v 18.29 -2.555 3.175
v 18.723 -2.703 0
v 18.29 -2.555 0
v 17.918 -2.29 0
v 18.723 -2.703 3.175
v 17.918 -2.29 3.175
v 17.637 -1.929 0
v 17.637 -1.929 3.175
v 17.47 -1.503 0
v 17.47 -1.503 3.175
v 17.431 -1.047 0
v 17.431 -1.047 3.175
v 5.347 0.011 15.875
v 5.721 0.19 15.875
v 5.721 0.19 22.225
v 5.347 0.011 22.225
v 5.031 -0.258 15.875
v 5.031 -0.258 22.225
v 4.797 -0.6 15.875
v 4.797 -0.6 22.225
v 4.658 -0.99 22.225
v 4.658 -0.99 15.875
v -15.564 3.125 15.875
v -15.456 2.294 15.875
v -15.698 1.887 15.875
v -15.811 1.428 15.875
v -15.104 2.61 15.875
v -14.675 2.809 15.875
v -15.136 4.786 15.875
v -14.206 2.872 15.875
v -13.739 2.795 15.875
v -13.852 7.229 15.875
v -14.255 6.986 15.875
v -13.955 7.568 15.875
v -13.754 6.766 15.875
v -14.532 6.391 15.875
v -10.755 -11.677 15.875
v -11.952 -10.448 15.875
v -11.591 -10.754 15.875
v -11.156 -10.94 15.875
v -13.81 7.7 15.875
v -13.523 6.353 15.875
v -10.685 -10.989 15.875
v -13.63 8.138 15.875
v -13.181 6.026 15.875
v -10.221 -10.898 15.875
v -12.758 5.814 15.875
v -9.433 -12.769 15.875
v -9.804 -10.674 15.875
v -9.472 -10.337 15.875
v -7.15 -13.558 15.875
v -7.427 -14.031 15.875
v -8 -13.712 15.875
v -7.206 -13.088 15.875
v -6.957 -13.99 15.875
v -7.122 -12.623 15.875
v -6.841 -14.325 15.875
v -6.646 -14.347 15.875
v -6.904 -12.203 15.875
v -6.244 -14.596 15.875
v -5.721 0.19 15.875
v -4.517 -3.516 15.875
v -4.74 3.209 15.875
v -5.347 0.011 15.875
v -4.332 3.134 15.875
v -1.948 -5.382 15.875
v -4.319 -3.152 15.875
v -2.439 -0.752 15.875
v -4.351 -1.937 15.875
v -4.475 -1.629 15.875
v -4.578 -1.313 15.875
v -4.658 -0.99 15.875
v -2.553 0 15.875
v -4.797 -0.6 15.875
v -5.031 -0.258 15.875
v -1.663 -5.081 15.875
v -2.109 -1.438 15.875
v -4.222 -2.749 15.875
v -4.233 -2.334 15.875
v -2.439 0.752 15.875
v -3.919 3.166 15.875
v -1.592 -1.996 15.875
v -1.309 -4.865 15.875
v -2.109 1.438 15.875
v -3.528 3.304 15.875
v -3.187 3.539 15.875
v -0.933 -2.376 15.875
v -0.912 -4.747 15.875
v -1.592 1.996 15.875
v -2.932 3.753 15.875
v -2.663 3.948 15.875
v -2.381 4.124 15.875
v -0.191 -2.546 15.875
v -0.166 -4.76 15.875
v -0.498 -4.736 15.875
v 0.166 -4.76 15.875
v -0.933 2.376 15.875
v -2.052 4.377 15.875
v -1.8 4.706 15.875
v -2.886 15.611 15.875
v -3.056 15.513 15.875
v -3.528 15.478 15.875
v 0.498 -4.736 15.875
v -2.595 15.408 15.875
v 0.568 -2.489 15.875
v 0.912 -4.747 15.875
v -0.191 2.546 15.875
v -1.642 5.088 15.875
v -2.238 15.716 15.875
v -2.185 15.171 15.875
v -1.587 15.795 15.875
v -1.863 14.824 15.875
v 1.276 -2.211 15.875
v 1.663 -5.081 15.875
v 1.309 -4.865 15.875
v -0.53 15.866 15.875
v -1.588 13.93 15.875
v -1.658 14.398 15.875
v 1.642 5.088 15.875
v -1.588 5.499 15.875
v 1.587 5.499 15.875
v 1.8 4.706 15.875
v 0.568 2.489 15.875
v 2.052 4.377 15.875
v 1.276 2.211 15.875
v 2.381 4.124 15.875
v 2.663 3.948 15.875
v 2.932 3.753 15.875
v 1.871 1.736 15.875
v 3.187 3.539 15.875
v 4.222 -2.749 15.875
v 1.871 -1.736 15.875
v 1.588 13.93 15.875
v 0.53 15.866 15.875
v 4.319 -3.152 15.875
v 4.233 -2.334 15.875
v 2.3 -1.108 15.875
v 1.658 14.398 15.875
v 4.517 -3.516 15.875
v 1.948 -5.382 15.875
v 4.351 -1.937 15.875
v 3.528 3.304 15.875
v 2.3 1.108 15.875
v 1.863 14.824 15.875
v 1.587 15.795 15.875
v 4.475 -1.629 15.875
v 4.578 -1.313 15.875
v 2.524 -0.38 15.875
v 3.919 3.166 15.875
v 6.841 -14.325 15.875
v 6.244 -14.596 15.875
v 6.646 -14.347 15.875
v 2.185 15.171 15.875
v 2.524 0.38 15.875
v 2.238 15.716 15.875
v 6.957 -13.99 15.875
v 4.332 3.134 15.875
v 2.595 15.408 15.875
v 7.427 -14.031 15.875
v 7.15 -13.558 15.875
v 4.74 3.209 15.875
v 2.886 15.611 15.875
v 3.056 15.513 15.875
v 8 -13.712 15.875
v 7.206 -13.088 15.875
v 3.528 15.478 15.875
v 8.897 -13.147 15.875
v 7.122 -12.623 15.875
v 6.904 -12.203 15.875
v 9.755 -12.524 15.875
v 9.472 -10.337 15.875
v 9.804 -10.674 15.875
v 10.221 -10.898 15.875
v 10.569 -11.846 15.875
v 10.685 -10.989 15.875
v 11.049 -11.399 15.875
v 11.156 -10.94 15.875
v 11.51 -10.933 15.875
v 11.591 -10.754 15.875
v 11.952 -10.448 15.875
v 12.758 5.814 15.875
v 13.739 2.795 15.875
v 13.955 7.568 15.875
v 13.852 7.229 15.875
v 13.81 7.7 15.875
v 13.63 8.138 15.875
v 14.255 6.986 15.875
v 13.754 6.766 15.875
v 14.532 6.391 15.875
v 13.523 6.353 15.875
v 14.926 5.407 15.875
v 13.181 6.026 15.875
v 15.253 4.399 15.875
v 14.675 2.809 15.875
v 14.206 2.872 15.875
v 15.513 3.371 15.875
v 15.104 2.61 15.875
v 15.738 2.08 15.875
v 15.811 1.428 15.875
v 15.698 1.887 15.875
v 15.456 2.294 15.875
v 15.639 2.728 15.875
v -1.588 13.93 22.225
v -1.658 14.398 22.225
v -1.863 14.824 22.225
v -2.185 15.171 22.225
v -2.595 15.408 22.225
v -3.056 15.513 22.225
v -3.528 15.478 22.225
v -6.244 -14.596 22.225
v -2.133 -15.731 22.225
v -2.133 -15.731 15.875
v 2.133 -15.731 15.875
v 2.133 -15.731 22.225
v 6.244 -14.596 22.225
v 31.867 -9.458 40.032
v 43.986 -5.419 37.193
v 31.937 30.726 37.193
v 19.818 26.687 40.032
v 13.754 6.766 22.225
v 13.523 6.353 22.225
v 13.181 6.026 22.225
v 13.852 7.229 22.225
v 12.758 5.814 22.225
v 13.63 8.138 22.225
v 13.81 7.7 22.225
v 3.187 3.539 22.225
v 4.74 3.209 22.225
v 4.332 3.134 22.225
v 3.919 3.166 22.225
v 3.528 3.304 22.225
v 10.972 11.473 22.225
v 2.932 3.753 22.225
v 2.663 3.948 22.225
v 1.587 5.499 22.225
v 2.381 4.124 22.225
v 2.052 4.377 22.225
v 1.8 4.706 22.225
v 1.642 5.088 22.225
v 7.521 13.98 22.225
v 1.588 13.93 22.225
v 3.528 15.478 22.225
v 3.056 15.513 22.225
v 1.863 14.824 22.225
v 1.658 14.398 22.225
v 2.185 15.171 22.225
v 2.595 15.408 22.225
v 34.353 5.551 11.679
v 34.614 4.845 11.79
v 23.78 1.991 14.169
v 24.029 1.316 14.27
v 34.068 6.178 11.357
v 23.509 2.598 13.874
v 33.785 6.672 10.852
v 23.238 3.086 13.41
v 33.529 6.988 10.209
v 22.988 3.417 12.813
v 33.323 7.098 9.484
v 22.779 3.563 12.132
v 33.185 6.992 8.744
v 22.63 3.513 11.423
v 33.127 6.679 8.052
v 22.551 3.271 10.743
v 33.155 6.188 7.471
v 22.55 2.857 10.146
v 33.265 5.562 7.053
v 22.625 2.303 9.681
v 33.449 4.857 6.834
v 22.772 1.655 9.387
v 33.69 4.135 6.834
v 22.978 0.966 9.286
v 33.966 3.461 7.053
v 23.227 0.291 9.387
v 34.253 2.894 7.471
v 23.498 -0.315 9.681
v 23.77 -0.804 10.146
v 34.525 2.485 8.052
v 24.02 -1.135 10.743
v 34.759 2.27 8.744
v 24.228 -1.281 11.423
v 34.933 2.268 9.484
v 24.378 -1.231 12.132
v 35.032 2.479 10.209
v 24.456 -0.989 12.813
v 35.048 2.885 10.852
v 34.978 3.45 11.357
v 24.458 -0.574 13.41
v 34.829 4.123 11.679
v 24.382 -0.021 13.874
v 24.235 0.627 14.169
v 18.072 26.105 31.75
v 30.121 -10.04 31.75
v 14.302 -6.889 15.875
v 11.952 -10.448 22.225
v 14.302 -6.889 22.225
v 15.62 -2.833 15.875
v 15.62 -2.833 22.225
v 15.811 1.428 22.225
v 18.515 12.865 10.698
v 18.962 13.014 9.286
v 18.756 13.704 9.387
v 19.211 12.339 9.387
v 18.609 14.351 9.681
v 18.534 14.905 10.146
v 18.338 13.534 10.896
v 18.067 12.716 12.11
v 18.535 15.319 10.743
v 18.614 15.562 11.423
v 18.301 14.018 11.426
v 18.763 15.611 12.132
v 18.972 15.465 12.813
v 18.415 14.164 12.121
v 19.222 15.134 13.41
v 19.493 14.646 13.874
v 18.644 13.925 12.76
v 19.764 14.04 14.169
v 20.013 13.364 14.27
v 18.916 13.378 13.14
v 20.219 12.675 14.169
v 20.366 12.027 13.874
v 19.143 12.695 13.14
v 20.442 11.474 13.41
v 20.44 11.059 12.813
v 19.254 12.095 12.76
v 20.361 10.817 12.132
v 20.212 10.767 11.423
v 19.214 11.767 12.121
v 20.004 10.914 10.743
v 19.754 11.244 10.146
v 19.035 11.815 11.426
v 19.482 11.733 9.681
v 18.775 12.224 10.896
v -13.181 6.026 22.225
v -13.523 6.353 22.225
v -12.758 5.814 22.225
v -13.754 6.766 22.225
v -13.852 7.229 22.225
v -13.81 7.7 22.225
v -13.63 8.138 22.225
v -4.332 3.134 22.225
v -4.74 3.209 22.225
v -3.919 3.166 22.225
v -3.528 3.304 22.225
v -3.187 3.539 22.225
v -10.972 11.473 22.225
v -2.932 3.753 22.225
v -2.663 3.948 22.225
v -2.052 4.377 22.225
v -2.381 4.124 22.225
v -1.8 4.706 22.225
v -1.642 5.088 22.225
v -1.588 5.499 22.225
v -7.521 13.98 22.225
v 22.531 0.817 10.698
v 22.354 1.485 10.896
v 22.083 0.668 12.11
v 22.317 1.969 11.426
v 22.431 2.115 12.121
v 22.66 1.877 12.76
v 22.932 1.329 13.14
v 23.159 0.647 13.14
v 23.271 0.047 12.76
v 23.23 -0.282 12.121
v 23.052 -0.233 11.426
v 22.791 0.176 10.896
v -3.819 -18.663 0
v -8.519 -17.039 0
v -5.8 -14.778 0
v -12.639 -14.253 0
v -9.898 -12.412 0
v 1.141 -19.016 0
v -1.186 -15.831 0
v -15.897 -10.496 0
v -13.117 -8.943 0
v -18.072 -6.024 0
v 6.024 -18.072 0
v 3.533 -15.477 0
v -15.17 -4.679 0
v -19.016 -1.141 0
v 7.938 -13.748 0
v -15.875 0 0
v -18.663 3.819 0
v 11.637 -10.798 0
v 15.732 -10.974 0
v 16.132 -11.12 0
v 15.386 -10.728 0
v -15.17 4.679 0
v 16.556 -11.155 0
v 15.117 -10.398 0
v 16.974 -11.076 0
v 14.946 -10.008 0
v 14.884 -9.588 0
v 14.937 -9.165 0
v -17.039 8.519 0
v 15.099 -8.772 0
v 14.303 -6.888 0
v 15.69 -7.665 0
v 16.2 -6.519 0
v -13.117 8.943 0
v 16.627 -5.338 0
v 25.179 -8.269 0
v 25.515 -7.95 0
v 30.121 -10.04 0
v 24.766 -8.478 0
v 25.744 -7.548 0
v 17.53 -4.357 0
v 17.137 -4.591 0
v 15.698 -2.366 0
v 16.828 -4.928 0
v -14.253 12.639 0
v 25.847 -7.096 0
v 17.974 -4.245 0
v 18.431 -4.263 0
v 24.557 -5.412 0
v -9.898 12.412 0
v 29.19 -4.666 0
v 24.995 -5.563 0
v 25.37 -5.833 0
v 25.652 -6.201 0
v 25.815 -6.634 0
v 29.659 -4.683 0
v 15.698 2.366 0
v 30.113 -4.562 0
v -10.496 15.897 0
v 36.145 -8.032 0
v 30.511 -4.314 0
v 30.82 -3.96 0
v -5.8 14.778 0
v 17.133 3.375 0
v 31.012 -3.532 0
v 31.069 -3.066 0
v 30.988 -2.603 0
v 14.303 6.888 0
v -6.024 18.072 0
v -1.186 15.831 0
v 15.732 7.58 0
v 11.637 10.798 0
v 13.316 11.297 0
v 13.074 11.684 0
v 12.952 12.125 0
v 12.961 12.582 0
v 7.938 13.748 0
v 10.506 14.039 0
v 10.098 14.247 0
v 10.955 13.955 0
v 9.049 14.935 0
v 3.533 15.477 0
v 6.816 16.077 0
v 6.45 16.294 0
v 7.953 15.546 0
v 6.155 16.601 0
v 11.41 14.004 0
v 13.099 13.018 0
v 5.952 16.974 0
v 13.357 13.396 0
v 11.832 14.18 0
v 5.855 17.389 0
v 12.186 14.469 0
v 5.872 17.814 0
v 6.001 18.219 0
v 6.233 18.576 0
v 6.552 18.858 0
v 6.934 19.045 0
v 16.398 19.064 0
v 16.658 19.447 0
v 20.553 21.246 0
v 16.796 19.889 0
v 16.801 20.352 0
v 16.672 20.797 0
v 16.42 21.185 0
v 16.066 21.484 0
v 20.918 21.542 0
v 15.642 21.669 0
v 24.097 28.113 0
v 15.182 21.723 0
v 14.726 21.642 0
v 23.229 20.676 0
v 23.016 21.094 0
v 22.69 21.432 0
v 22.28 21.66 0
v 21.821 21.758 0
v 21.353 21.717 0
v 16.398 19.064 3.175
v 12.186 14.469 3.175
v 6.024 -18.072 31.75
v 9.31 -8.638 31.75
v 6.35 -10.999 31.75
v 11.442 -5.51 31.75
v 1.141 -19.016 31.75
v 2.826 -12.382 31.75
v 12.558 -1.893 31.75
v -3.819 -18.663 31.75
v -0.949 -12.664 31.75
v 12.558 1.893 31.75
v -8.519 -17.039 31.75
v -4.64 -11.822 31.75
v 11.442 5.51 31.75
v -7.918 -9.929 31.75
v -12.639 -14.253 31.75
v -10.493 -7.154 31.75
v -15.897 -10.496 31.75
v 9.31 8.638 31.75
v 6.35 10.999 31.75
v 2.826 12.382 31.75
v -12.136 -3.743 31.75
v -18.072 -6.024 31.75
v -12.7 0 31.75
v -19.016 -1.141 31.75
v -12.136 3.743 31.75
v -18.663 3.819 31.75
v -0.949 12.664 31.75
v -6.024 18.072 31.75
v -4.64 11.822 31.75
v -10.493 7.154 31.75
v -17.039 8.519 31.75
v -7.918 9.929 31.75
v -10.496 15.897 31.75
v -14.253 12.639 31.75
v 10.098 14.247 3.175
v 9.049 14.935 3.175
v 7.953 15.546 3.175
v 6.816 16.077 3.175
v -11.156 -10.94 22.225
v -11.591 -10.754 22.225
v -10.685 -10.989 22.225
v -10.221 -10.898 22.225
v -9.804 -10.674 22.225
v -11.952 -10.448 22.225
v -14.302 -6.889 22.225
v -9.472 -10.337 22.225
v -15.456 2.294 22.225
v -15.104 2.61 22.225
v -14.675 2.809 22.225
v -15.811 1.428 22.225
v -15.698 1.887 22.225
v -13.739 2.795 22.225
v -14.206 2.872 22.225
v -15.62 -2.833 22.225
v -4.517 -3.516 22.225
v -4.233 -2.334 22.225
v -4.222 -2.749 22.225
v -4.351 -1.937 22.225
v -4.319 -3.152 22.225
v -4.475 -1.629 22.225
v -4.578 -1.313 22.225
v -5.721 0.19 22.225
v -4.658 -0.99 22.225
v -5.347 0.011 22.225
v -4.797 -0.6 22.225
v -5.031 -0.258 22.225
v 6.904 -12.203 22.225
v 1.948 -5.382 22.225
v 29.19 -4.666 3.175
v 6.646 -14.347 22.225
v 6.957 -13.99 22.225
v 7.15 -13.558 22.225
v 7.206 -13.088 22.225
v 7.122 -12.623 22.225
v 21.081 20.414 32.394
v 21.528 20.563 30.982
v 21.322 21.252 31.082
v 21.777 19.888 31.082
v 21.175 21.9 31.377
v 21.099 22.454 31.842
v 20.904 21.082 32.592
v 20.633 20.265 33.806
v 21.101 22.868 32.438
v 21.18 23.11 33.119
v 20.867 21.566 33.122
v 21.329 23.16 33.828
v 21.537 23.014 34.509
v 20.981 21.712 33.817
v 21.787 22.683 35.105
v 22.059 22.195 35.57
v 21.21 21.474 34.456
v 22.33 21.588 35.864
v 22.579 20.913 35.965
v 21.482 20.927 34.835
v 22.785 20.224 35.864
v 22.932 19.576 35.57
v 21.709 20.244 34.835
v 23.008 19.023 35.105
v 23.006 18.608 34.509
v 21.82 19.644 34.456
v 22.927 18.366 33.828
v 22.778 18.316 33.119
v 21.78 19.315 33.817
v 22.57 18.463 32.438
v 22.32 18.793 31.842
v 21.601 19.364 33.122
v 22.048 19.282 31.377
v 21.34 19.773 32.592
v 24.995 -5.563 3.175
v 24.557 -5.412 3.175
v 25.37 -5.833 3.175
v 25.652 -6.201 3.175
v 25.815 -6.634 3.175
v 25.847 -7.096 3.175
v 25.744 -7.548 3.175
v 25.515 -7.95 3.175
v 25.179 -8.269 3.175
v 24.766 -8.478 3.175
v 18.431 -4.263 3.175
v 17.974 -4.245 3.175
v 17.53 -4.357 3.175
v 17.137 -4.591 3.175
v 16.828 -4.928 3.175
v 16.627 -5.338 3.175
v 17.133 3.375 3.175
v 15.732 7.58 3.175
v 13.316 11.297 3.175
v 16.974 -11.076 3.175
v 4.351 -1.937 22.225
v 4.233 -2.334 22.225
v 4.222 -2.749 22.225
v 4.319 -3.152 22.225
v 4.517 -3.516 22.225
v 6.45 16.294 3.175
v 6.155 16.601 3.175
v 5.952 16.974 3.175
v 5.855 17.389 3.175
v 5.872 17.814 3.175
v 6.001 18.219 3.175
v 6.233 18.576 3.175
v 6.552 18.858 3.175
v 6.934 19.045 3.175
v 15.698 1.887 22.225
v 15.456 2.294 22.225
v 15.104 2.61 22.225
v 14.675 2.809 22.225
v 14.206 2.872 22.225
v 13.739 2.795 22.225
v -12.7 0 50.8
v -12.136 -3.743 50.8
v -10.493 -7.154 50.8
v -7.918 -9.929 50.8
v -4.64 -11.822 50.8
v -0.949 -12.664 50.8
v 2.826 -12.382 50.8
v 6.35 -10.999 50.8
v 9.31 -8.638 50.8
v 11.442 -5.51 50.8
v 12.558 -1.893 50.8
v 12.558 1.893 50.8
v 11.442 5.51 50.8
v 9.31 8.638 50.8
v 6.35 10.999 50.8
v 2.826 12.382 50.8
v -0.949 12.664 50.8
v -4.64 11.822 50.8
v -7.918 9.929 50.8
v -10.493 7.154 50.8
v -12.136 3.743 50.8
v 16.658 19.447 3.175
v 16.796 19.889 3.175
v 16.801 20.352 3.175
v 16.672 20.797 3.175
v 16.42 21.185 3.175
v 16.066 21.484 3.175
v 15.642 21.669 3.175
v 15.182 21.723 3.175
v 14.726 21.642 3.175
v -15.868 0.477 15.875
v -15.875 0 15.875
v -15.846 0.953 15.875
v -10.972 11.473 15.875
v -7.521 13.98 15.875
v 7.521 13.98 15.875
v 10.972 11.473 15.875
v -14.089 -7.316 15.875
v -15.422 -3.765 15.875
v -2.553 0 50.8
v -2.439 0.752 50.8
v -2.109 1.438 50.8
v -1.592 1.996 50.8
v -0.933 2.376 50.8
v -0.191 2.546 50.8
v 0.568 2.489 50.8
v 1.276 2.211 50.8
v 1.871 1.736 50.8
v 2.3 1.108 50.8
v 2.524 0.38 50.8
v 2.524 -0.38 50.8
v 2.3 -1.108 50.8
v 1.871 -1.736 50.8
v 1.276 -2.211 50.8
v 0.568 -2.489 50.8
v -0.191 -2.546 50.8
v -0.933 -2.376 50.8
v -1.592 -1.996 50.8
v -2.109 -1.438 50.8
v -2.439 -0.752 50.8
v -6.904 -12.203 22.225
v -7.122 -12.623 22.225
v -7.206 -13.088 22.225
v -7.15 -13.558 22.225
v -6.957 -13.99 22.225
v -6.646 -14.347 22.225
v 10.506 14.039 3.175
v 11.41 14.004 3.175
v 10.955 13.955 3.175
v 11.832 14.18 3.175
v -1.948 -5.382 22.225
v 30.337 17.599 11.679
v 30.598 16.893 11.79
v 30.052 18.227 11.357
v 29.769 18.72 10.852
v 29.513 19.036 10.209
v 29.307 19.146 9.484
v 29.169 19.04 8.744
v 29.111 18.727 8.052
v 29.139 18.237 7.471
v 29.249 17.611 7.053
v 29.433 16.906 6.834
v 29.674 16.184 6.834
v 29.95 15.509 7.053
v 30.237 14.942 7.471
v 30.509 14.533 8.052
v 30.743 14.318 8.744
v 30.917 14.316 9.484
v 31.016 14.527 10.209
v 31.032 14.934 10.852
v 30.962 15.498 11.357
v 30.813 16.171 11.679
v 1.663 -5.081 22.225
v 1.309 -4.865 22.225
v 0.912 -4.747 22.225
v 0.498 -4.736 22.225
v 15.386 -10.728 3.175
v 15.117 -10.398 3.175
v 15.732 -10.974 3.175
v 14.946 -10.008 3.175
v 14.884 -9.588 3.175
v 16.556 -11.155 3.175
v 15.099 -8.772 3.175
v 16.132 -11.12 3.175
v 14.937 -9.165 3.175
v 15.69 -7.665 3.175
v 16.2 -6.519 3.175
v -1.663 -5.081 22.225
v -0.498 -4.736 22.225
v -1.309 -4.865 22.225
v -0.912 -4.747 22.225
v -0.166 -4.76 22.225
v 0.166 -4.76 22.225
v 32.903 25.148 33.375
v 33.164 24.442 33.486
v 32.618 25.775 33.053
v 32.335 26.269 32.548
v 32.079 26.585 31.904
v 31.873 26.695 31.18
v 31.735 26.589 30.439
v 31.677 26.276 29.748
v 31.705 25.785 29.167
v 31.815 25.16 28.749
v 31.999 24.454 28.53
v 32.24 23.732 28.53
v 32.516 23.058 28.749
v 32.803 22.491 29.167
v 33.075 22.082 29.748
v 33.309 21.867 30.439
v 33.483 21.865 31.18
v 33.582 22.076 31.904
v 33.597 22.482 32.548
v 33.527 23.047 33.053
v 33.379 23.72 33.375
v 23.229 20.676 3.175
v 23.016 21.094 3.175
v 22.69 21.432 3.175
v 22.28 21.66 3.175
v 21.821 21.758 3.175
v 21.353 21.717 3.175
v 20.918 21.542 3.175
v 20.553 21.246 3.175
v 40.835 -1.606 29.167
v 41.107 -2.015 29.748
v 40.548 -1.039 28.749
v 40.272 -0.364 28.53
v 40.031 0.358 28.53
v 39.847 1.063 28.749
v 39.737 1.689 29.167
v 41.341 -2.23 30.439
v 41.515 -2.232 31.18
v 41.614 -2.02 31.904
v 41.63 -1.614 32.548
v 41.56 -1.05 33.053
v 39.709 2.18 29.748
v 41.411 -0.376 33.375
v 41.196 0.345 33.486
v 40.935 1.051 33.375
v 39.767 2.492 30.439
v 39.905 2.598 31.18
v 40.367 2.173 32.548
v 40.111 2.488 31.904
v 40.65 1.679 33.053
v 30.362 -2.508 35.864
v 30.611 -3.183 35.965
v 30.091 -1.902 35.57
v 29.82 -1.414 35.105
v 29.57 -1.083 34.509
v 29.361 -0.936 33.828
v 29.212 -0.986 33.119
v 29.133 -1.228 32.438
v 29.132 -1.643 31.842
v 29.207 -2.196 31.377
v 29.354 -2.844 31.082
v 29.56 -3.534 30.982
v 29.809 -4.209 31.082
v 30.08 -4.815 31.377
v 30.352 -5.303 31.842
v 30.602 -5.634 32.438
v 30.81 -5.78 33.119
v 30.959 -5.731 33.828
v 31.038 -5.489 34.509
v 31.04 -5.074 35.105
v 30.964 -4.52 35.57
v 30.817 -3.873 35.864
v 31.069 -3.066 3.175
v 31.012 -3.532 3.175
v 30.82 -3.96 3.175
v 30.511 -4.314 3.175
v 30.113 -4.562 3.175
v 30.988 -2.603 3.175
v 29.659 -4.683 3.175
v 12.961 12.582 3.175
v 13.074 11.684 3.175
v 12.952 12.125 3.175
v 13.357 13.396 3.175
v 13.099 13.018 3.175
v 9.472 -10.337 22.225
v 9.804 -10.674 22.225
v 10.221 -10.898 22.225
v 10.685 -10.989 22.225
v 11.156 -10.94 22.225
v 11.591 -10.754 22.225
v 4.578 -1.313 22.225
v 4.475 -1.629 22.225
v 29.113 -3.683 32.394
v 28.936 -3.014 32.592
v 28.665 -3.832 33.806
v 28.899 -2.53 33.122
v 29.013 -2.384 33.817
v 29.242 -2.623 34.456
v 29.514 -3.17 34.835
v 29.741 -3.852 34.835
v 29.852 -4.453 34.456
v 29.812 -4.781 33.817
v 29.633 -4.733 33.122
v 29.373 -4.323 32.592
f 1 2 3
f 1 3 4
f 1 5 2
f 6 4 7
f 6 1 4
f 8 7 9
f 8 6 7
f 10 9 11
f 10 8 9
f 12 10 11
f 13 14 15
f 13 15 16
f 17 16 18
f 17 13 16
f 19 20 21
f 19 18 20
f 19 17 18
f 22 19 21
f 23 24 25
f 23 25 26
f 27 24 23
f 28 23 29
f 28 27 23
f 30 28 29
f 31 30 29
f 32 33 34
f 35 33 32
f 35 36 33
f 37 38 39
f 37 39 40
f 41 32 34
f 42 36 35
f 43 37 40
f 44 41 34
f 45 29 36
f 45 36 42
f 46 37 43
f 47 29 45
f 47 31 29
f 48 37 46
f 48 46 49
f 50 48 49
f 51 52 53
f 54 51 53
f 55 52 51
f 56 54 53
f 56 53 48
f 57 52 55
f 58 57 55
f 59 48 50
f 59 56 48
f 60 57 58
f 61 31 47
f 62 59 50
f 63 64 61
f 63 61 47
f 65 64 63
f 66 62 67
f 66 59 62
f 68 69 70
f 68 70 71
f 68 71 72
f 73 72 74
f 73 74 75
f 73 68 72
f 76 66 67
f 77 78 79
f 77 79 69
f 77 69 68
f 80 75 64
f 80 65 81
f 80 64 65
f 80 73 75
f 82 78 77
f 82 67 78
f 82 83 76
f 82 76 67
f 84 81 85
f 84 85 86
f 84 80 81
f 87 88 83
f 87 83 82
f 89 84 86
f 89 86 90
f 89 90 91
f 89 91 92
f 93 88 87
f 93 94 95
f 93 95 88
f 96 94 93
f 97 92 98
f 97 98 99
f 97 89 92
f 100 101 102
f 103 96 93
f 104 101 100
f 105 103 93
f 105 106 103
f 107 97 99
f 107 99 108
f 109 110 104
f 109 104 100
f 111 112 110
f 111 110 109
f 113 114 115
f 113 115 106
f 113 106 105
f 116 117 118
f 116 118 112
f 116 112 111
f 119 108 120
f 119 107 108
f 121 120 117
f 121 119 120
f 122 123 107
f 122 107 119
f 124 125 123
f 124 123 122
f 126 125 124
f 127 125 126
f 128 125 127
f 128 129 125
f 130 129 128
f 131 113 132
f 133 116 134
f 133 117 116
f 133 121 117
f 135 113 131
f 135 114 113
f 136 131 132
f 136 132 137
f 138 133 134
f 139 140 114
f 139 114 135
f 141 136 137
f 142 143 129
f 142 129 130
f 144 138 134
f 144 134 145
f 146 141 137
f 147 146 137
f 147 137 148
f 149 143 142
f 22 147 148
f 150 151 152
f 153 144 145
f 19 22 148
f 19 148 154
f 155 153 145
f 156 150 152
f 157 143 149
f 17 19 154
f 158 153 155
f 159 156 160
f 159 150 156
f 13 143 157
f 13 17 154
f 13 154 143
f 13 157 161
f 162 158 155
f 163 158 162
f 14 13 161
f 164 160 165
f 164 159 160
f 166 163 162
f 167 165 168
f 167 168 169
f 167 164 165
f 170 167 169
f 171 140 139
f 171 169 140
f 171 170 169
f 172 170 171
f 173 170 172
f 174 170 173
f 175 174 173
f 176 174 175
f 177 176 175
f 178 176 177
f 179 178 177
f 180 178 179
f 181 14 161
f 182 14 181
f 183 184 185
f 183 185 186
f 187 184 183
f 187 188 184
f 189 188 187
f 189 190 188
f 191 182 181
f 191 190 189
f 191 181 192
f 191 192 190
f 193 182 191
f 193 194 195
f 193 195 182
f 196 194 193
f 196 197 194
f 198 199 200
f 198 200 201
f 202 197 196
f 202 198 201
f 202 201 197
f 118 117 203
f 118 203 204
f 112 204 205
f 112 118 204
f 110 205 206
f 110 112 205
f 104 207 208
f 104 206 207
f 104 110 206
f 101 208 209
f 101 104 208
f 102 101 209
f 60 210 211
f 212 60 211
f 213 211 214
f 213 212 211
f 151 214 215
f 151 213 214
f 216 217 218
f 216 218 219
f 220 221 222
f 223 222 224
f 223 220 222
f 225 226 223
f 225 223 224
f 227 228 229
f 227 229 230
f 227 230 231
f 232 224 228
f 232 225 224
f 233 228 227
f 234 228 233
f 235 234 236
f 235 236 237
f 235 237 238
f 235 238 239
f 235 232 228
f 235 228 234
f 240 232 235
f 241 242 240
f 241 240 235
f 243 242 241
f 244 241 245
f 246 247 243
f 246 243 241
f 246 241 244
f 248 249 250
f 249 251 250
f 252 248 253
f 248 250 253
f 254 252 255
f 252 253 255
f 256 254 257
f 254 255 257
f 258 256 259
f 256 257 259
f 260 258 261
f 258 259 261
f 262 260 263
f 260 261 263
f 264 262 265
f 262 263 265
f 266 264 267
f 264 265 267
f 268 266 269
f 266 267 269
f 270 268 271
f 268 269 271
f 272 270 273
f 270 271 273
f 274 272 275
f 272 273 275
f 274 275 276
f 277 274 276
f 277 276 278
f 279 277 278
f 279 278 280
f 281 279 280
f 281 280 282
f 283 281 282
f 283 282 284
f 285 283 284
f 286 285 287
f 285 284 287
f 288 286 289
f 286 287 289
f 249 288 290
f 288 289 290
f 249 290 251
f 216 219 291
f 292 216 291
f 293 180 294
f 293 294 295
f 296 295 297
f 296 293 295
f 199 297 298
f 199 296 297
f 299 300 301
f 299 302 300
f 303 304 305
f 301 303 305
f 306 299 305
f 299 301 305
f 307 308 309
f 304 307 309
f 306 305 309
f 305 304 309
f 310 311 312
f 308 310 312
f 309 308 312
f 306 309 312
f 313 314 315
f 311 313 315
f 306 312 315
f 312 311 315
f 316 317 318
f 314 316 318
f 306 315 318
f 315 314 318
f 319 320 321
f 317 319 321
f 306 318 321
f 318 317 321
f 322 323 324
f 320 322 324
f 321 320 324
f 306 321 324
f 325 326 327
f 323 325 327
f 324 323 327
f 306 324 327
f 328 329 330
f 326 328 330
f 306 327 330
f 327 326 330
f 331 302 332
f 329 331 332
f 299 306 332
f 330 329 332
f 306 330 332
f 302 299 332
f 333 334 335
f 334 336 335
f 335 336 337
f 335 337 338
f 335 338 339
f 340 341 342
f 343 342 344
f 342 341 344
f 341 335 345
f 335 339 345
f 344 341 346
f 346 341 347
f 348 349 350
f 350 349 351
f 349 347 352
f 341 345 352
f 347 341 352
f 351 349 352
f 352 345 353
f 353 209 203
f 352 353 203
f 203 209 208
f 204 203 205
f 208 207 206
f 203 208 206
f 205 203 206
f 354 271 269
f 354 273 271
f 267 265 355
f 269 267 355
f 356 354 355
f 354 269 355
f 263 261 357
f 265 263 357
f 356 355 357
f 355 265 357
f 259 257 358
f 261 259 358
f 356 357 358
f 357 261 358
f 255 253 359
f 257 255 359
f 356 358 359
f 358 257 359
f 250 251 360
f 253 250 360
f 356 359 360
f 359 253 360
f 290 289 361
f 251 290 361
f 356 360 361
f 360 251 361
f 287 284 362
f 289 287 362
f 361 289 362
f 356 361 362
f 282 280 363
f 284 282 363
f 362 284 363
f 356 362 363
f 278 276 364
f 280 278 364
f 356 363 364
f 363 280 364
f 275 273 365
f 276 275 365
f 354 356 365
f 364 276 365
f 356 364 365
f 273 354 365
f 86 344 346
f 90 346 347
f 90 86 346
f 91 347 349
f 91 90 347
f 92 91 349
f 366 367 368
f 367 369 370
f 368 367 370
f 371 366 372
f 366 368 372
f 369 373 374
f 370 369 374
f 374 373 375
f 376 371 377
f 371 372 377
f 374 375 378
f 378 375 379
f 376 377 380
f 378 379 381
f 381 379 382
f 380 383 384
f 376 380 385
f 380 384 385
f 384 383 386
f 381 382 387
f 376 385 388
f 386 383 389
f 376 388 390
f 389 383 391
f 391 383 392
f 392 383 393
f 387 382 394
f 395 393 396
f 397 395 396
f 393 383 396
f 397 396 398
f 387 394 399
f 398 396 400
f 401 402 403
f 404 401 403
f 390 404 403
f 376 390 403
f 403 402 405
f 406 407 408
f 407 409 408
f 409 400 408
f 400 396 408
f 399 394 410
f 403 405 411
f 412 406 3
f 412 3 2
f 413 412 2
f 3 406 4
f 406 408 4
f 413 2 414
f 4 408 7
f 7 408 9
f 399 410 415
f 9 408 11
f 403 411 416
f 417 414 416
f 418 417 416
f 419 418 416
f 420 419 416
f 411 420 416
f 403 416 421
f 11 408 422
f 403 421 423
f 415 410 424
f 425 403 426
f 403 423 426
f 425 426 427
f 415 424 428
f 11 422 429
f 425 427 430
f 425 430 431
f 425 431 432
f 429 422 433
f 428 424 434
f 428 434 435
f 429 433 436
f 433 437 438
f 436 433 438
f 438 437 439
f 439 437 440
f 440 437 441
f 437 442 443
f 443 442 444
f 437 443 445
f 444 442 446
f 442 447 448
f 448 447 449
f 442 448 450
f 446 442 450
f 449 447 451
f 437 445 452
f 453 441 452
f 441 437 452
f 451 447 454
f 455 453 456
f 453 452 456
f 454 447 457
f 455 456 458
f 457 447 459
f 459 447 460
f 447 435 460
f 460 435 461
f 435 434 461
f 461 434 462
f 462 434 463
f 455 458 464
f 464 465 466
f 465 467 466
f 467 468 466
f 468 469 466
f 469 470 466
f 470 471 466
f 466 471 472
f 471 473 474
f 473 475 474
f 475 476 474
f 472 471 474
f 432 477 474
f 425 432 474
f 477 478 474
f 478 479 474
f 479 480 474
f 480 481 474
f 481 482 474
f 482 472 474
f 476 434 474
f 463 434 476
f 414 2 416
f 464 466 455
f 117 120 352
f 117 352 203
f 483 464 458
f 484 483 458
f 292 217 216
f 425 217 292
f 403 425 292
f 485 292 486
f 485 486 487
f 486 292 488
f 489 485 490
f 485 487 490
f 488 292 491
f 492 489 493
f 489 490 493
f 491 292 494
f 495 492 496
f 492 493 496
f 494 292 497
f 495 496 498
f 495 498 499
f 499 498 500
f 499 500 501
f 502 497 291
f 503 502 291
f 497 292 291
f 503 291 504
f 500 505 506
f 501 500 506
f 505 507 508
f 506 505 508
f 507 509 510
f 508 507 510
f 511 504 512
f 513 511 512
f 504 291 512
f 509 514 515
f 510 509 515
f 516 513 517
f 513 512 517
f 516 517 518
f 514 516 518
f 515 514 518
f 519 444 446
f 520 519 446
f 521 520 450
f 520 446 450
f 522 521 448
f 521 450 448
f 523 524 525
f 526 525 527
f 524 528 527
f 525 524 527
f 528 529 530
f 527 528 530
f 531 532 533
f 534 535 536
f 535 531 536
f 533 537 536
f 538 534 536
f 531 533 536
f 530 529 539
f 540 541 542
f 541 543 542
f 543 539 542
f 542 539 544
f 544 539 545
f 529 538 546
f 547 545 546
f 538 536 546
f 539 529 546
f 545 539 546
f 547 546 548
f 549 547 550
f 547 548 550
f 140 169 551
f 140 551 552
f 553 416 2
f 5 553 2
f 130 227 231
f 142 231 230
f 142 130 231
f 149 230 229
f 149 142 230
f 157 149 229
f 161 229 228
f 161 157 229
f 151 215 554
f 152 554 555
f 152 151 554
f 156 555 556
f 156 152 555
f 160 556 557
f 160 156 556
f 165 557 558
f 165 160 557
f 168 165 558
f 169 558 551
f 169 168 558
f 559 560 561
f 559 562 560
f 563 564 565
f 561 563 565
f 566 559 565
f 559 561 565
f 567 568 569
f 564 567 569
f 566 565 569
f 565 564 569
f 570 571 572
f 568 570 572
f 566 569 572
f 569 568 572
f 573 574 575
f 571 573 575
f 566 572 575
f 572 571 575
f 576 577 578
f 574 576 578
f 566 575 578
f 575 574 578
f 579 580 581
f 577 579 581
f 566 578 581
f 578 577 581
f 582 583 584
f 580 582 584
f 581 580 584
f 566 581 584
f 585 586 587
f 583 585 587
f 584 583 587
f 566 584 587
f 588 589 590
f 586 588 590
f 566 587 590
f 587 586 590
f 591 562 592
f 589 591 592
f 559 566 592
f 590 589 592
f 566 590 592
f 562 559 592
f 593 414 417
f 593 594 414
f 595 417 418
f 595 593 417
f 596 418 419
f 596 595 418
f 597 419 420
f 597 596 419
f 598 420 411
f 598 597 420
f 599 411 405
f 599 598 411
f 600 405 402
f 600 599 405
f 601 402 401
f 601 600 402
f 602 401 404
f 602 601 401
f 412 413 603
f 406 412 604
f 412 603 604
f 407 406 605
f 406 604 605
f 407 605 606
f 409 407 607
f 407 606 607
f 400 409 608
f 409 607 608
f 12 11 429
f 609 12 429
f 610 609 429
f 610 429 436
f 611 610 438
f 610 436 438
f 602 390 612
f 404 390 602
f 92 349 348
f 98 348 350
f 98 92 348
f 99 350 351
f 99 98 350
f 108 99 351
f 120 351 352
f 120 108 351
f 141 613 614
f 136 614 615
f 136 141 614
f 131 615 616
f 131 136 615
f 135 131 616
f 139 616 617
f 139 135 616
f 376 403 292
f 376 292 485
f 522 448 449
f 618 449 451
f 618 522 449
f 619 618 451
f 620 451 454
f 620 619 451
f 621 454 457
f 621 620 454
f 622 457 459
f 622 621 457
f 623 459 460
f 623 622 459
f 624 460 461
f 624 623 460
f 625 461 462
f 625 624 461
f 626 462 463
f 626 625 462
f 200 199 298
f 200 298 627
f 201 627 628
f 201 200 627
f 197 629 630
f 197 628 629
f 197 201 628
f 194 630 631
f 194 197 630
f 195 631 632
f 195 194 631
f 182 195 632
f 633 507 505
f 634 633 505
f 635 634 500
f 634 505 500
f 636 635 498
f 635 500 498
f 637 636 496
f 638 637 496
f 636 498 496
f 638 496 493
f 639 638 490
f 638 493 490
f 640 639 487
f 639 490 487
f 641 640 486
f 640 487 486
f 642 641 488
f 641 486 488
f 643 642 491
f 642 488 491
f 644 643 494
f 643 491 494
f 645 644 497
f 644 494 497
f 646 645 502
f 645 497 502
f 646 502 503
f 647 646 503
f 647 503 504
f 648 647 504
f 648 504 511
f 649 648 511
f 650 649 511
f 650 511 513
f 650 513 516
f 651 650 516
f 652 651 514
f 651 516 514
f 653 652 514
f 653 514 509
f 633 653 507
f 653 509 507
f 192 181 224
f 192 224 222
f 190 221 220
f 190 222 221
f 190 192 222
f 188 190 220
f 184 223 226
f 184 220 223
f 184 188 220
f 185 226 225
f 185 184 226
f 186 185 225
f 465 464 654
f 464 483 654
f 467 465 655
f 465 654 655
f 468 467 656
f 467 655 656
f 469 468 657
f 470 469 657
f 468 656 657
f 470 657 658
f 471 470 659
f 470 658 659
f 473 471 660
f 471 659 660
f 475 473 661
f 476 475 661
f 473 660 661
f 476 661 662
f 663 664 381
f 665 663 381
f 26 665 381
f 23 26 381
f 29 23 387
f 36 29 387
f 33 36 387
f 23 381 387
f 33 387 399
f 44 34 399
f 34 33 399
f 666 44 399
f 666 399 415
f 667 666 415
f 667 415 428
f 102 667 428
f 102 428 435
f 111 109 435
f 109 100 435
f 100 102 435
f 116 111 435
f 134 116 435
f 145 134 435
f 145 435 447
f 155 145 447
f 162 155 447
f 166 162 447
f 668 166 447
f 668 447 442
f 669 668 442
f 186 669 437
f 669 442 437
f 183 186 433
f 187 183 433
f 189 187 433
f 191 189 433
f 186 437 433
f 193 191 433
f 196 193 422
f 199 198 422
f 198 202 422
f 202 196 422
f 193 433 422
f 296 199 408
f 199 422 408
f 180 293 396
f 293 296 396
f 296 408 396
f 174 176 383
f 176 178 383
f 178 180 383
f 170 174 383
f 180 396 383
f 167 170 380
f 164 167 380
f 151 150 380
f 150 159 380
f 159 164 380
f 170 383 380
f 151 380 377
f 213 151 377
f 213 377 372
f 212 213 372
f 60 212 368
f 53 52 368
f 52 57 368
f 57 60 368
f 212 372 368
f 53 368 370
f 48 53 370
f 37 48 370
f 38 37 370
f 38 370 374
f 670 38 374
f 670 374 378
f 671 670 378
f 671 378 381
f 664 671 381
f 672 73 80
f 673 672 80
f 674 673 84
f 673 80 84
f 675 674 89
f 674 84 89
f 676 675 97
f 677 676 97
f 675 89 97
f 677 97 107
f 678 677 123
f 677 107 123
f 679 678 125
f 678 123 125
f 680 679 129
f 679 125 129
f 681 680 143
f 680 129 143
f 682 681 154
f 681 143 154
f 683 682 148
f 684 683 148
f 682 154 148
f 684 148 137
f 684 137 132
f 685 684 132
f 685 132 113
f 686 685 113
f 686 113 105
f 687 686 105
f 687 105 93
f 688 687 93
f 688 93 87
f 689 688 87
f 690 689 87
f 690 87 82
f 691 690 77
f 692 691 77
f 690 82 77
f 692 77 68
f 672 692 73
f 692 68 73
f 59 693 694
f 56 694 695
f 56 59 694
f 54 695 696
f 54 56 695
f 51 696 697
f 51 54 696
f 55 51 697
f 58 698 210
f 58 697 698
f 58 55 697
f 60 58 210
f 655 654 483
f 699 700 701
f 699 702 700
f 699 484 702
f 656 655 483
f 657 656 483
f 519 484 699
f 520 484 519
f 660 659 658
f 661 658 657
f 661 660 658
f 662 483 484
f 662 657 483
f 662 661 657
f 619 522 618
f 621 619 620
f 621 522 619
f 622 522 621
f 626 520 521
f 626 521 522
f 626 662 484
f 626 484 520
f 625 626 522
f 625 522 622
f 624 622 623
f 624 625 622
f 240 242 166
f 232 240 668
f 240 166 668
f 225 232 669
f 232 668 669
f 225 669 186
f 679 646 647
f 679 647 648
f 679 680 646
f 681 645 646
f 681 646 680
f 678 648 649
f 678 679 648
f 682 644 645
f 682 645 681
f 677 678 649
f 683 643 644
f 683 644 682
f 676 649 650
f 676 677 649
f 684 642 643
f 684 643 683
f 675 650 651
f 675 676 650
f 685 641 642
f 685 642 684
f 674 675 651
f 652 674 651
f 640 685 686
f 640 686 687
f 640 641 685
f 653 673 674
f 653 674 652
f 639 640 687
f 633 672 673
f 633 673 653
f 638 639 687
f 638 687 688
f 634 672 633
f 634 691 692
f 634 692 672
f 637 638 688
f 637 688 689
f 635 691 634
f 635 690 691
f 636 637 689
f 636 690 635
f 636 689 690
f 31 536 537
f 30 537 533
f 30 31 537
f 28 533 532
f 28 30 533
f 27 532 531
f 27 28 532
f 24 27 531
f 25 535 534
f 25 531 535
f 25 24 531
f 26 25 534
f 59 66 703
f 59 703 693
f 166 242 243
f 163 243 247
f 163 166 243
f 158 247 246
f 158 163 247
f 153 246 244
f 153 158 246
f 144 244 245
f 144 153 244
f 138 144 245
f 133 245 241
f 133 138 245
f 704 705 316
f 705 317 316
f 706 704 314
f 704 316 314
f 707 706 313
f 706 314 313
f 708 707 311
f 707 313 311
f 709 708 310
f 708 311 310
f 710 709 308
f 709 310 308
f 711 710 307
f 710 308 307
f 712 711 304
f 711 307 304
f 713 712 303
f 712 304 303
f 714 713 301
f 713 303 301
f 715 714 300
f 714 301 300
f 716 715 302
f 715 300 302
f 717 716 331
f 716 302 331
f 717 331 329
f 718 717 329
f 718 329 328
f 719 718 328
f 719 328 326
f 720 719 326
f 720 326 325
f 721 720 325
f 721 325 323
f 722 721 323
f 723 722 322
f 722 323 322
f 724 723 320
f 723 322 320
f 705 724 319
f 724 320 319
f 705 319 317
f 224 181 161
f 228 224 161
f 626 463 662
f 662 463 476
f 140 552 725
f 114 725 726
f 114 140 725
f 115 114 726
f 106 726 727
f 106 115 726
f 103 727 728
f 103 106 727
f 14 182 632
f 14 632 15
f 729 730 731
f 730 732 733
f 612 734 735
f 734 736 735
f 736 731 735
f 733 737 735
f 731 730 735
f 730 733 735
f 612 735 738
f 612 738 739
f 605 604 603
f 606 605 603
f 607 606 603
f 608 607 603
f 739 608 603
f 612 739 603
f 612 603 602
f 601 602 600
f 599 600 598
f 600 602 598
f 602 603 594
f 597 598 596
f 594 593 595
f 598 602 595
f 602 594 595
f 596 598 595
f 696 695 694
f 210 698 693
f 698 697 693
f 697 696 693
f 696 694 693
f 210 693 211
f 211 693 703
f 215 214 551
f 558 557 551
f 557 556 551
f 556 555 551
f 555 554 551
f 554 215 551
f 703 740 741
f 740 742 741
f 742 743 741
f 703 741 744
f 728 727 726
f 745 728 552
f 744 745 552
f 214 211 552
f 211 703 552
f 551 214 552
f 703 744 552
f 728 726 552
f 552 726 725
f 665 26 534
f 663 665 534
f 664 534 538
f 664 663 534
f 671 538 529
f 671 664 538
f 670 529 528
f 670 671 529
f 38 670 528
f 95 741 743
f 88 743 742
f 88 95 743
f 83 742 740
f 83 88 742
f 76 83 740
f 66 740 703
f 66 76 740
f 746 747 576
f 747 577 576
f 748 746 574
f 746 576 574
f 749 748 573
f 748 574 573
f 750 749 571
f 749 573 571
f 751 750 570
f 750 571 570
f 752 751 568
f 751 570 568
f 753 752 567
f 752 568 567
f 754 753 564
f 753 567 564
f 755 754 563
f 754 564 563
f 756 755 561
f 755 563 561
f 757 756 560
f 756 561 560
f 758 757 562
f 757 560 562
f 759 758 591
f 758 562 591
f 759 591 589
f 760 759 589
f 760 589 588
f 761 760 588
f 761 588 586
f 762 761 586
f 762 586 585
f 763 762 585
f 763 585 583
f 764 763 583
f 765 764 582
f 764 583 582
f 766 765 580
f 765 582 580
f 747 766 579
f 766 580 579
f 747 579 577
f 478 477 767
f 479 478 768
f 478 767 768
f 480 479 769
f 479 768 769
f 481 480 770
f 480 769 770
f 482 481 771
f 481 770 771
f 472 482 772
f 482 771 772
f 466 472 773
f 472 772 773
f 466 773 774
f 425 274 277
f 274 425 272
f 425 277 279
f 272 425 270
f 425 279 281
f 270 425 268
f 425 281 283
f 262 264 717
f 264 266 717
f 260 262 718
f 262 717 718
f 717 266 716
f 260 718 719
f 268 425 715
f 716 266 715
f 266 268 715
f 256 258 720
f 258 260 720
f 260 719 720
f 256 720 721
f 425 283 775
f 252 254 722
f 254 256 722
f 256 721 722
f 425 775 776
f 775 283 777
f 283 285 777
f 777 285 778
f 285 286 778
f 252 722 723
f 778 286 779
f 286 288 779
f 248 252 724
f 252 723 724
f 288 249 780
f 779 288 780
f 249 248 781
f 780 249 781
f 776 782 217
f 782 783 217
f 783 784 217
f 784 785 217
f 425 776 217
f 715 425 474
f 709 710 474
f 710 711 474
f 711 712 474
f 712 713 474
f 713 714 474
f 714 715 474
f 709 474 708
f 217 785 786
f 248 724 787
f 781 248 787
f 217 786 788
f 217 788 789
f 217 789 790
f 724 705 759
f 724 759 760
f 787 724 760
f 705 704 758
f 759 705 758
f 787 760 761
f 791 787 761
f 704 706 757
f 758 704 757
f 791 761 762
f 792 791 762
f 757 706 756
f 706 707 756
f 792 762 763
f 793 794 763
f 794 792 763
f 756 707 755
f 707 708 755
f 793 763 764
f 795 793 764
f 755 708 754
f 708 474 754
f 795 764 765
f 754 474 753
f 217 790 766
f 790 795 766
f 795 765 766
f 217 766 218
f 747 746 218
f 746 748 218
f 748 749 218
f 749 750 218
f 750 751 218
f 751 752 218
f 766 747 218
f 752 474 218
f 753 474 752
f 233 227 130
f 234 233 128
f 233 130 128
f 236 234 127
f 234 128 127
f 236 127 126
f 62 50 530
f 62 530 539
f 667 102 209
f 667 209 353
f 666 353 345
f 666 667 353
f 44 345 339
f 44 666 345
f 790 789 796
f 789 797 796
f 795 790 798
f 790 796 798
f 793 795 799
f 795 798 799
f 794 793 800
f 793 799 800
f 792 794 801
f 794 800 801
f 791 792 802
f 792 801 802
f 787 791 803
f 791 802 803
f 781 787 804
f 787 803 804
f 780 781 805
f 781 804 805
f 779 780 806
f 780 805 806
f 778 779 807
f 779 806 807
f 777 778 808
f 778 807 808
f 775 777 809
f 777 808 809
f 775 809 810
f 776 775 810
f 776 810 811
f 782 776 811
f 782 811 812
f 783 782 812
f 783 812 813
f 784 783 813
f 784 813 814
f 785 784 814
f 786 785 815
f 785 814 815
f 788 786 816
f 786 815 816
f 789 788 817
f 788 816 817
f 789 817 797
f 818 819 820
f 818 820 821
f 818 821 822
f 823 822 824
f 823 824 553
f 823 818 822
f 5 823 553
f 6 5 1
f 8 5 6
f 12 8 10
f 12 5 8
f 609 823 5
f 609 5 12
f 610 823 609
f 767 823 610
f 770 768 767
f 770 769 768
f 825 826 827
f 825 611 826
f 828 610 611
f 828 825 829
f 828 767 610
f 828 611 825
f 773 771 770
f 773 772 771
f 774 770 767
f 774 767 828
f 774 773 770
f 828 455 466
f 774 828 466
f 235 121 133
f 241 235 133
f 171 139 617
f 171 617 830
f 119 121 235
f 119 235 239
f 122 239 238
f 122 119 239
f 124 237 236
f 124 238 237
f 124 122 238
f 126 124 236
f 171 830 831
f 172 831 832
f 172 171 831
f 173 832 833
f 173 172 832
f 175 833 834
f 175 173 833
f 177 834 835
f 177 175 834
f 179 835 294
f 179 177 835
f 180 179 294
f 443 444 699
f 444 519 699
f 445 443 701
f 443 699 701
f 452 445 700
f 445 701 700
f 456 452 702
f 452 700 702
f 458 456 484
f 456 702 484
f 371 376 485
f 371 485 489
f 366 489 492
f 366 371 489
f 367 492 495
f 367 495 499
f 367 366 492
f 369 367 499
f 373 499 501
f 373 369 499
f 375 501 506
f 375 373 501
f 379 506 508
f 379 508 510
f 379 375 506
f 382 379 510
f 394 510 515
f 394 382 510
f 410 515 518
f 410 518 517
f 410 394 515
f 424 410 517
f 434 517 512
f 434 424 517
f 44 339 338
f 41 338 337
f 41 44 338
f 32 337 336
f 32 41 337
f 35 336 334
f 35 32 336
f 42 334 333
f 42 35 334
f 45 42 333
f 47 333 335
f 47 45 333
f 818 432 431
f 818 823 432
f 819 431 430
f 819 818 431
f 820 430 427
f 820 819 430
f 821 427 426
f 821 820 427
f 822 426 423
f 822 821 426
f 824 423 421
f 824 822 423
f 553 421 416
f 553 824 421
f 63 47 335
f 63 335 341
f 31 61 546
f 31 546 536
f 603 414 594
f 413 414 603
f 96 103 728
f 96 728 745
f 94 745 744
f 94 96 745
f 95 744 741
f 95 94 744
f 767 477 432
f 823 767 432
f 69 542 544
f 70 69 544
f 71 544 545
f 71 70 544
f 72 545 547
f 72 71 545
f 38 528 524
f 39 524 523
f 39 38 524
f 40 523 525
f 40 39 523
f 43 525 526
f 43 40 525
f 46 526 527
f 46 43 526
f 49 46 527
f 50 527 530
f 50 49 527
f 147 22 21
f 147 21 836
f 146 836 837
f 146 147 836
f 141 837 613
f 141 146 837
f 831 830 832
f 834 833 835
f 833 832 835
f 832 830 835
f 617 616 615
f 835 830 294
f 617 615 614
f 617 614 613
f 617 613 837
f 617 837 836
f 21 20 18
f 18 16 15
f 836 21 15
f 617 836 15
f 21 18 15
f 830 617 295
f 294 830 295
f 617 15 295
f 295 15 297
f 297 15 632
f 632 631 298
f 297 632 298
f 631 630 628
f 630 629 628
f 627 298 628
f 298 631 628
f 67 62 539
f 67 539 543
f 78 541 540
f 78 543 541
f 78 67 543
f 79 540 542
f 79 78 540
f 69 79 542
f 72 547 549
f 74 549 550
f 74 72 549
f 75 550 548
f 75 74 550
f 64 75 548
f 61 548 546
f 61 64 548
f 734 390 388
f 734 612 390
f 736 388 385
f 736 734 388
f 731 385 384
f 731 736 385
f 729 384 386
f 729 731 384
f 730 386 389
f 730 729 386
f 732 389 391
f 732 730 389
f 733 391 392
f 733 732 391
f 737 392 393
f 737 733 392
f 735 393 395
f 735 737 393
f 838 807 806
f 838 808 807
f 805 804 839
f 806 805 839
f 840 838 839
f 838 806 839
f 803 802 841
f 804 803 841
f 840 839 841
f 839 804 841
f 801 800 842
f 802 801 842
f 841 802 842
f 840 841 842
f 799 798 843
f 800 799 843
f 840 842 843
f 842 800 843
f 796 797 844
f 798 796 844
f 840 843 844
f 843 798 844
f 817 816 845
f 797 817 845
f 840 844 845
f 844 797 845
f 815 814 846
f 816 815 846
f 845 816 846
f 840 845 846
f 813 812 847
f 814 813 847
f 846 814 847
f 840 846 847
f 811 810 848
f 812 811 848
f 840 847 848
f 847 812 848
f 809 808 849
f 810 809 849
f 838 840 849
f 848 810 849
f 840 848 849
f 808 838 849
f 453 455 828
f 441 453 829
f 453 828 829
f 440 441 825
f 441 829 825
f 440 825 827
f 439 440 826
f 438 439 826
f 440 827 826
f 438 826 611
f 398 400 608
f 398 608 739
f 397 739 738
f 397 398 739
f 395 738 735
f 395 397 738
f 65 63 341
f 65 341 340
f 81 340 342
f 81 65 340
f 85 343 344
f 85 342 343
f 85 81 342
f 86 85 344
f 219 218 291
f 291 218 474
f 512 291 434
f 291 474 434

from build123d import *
from build123d.topology import SkipClean

# Parameters (mm, degrees)
BOSS_EXTRUDE1_DEPTH         = 31.75
BOSS_EXTRUDE4_DEPTH         = 38.1
SKETCH11_R                  = 12.7
BOSS_EXTRUDE5_DEPTH         = 19.05
F_1_4_20_TAPPED_HOLE3_D     = 5.1054
F_1_4_20_TAPPED_HOLE3_DEPTH = 38.1
F_1_4_20_TAPPED_HOLE3_TIP   = 1.533816902
F_1_4_20_TAPPED_HOLE4_D     = 5.1054
F_1_4_20_TAPPED_HOLE4_DEPTH = 11.43
F_1_4_20_TAPPED_HOLE4_TIP   = 1.533816902
CUT_EXTRUDE3_DEPTH          = 3.175
SKETCH17_R                  = 15.875
CUT_EXTRUDE4_DEPTH          = 15.875
FILLET3_R                   = 1.5875
CUT_EXTRUDE5_DEPTH          = 6.35
FILLET4_R                   = 1.5875


with BuildPart() as part:
    # Sketch1 → Boss-Extrude1 (new body)
    with BuildSketch(Plane.XY):
        with BuildLine():
            Line((18.072416828, 26.104602085), (30.120694713, -10.040231571))
            Line((30.120694713, -10.040231571), (6.024138943, -18.072416828))
            ThreePointArc((6.024138943, -18.072416828), (-18.072416828, -6.024138943), (-6.024138943, 18.072416828))
            Line((-6.024138943, 18.072416828), (18.072416828, 26.104602085))
        make_face()
    extrude(amount=BOSS_EXTRUDE1_DEPTH)

    # Sketch10 → Boss-Extrude4 (add)
    with BuildSketch(Plane(origin=(-6.024138943, 18.072416828, 0), x_dir=(0.9486832980505138, 0.31622776601683816, 0), z_dir=(-0.31622776601683816, 0.9486832980505138, 0))):
        Polygon((25.4, 0), (31.75, 0), (40.015050599, -37.192726958), (27.240344607, -40.031550568), (25.4, -31.75), align=None)
    extrude(amount=-BOSS_EXTRUDE4_DEPTH)

    # Sketch11 → Boss-Extrude5 (add)
    with BuildSketch(Plane.XY.offset(31.75)):
        with Locations(Location((0, 0, 0), (0, 0, 180))):
            Circle(SKETCH11_R)
    extrude(amount=BOSS_EXTRUDE5_DEPTH)

    # 1/4-20 Tapped Hole3
    with Locations(Plane.XY.offset(50.8)):
        with Locations((0, 0)):
            Hole(F_1_4_20_TAPPED_HOLE3_D / 2, depth=F_1_4_20_TAPPED_HOLE3_DEPTH)
            with Locations((0, 0, -(F_1_4_20_TAPPED_HOLE3_DEPTH + F_1_4_20_TAPPED_HOLE3_TIP / 2))):  # 118° drill point
                Cone(0, F_1_4_20_TAPPED_HOLE3_D / 2, F_1_4_20_TAPPED_HOLE3_TIP, mode=Mode.SUBTRACT)

    # 1/4-20 Tapped Hole4
    with Locations(Plane(origin=(28.703250202, 9.567750067, -6.723529533), x_dir=(-0.2057983060639255, -0.06859943535464187, -0.9761870592720655), z_dir=(0.9260923589044555, 0.30869745296815215, -0.21693046192214882))):
        with Locations((-38.637542166, 12.7), (-16.412542166, 6.35), (-16.412542166, -6.35), (-38.637542166, -12.7)):
            Hole(F_1_4_20_TAPPED_HOLE4_D / 2, depth=F_1_4_20_TAPPED_HOLE4_DEPTH)
            with Locations((0, 0, -(F_1_4_20_TAPPED_HOLE4_DEPTH + F_1_4_20_TAPPED_HOLE4_TIP / 2))):  # 118° drill point
                Cone(0, F_1_4_20_TAPPED_HOLE4_D / 2, F_1_4_20_TAPPED_HOLE4_TIP, mode=Mode.SUBTRACT)

    # Sketch16 → Cut-Extrude3 (cut)
    with BuildSketch(Plane(origin=(0, 0, 0), x_dir=(-1, 0, 0), z_dir=(0, 0, -1))):
        with BuildLine():
            Line((-30.578183366, -6.540991497), (-16.999386581, -3.994967099))
            ThreePointArc((-16.999386581, -3.994967099), (-15.110000404, -8.753673173), (-11.921633961, -12.759841298))
            Line((-11.921633961, -12.759841298), (-30.578183366, -6.540991497))
        make_face()
        with BuildLine():
            Line((-31.84160072, -5.162718019), (-17.29194463, -2.434657503))
            ThreePointArc((-17.29194463, -2.434657503), (-16.566382092, 5.522127364), (-12.372761203, 12.32289278))
            Line((-12.372761203, 12.32289278), (-22.375649764, 23.235134847))
            Line((-22.375649764, 23.235134847), (-31.84160072, -5.162718019))
        make_face()
        with BuildLine():
            Line((-1.88140239, 17.360853415), (-20.537951794, 23.579703217))
            Line((-20.537951794, 23.579703217), (-11.202529005, 13.395605628))
            ThreePointArc((-11.202529005, 13.395605628), (-6.83579642, 16.068938781), (-1.88140239, 17.360853415))
        make_face()
    extrude(amount=-CUT_EXTRUDE3_DEPTH, mode=Mode.SUBTRACT)

    # Sketch17 → Cut-Extrude4 (cut)
    with BuildSketch(Plane(origin=(0, 0, 0), x_dir=(-1, 0, 0), z_dir=(0, 0, -1))):
        Circle(SKETCH17_R)
    extrude(amount=-CUT_EXTRUDE4_DEPTH, mode=Mode.SUBTRACT)

    # Fillet3
    fillet3_edges = [part.edges().sort_by_distance(p)[0] for p in [
        (31.84160072, -5.162718019, 1.5875),
        (22.375649764, 23.235134847, 1.5875),
        (12.372761203, 12.32289278, 1.5875),
        (17.29194463, -2.434657503, 1.5875),
        (11.202529005, 13.395605628, 1.5875),
        (20.537951794, 23.579703217, 1.5875),
        (1.88140239, 17.360853415, 1.5875),
        (16.999386581, -3.994967099, 1.5875),
        (11.921633961, -12.759841298, 1.5875),
        (30.578183366, -6.540991497, 1.5875),
    ]]
    fillet(fillet3_edges, radius=FILLET3_R)

    # Sketch19 → Cut-Extrude5 (cut)
    with SkipClean():  # the faces are left unmerged after this step: merging them gives an invalid solid
        with BuildSketch(Plane(origin=(0, 0, 15.875), x_dir=(-1, 0, 0), z_dir=(0, 0, -1))):
            with BuildLine():
                Line((1.5875, 4.490128061), (1.5875, 15.795425564))
                ThreePointArc((1.5875, 15.795425564), (9.33109088, 12.843144786), (14.531777932, 6.390857152))
                Line((14.531777932, 6.390857152), (3.779801072, 2.897328097))
                ThreePointArc((3.779801072, 2.897328097), (2.799327264, 3.852943436), (1.5875, 4.490128061))
            make_face()
            with BuildLine():
                Line((-1.5875, 4.490128061), (-1.5875, 15.795425564))
                ThreePointArc((-1.5875, 15.795425564), (-9.33109088, 12.843144786), (-14.531777932, 6.390857152))
                Line((-14.531777932, 6.390857152), (-3.779801072, 2.897328097))
                ThreePointArc((-3.779801072, 2.897328097), (-2.799327264, 3.852943436), (-1.5875, 4.490128061))
            make_face()
            with BuildLine():
                Line((4.76093003, -0.122276342), (15.512906889, 3.371252713))
                ThreePointArc((15.512906889, 3.371252713), (15.098022196, -4.905644786), (10.568632679, -11.845658627))
                Line((10.568632679, -11.845658627), (3.923545533, -2.69948082))
                ThreePointArc((3.923545533, -2.69948082), (4.529406659, -1.471693436), (4.76093003, -0.122276342))
            make_face()
            with BuildLine():
                Line((1.354916576, -4.565698996), (8.000003722, -13.711876803))
                ThreePointArc((8.000003722, -13.711876803), (0, -15.875), (-8.000003722, -13.711876803))
                Line((-8.000003722, -13.711876803), (-1.354916576, -4.565698996))
                ThreePointArc((-1.354916576, -4.565698996), (0, -4.7625), (1.354916576, -4.565698996))
            make_face()
            with BuildLine():
                Line((-3.923545533, -2.69948082), (-10.568632679, -11.845658627))
                ThreePointArc((-10.568632679, -11.845658627), (-15.098022196, -4.905644786), (-15.512906889, 3.371252713))
                Line((-15.512906889, 3.371252713), (-4.76093003, -0.122276342))
                ThreePointArc((-4.76093003, -0.122276342), (-4.529406659, -1.471693436), (-3.923545533, -2.69948082))
            make_face()
        extrude(amount=-CUT_EXTRUDE5_DEPTH, mode=Mode.SUBTRACT)

    # Fillet4
    # the kernel refuses this fillet: 1.5875 mm, written as the material it adds along each edge
    with BuildSketch(Plane(origin=(-3.779801072, 2.897328097, 15.875), x_dir=(0.678616300980504, 0.7344929652784552, 0), z_dir=(0, 0, 1)), Plane(origin=(1.5875, 4.490128061, 15.875), x_dir=(0.9082482904638647, -0.4184316465917308, 0), z_dir=(0, 0, 1)), Plane(origin=(1.354916576, -4.565698996, 15.875), x_dir=(-0.9807362530563359, -0.1953366374775062, 0), z_dir=(0, 0, 1)), Plane(origin=(4.76093003, -0.122276342, 15.875), x_dir=(-0.1172879872498498, -0.9930979448407287, 0), z_dir=(0, 0, 1))) as fillet4_piece_1:
        with BuildLine():
            CenterArc((1.019590872, 1.580803791), FILLET4_R, 204.735610317, 60)
            Line((-0.422253289, 0.916543552), (0, 0))
            ThreePointArc((0, 0), (0.436967517, 0.020088626), (0.873935033, 0))
        make_face()
    extrude(amount=8.872833134)
    with BuildSketch(Plane(origin=(-1.5875, 4.490128061, 15.875), x_dir=(0, 1, 0), z_dir=(0, 0, 1)), Plane(origin=(3.779801072, 2.897328097, 15.875), x_dir=(0.9510565162951539, 0.30901699437494645, 0), z_dir=(0, 0, 1)), Plane(origin=(-4.76093003, -0.122276342, 15.875), x_dir=(-0.9510565162951536, 0.3090169943749475, 0), z_dir=(0, 0, 1)), Plane(origin=(-1.354916576, -4.565698996, 15.875), x_dir=(-0.5877852522924731, -0.8090169943749473, 0), z_dir=(0, 0, 1)), Plane(origin=(3.923545533, -2.69948082, 15.875), x_dir=(0.5877852522924732, -0.8090169943749472, 0), z_dir=(0, 0, 1))) as fillet4_piece_2:
        with BuildLine():
            CenterArc((1.009133253, 1.5875), FILLET4_R, 210, 60)
            ThreePointArc((-0.365682075, 0.79375), (-0.164595577, 0.405280717), (0, 0))
            Line((0, 0), (1.009133253, 0))
        make_face()
    extrude(amount=8.872833134)
    with BuildSketch(Plane(origin=(-1.5875, 15.795425564, 15.875), x_dir=(-0.9868856549354627, -0.16142089109716581, 0), z_dir=(0, 0, 1)), Plane(origin=(14.531777932, 6.390857152, 15.875), x_dir=(-0.4584848292240369, 0.8887022343684108, 0), z_dir=(0, 0, 1)), Plane(origin=(-15.512906889, 3.371252713, 15.875), x_dir=(-0.15144404853577972, -0.9884658315607537, 0), z_dir=(0, 0, 1)), Plane(origin=(-8.000003722, -13.711876803, 15.875), x_dir=(0.8932880855464623, -0.4494845895253098, 0), z_dir=(0, 0, 1)), Plane(origin=(10.568632679, -11.845658627, 15.875), x_dir=(0.7035264471488165, 0.7106690778148178, 0), z_dir=(0, 0, 1))) as fillet4_piece_3:
        with BuildLine():
            CenterArc((1.867758316, 1.584453457), FILLET4_R, 170.710620558, 102.839588407)
            Line((0.301077339, 1.840709121), (0, 0))
            ThreePointArc((0, 0), (0.983030693, -0.030465433), (1.966061385, 0))
        make_face()
    extrude(amount=11.265153463)
    with BuildSketch(Plane(origin=(-14.531777932, 6.390857152, 15.875), x_dir=(0.45848482922403855, 0.88870223436841, 0), z_dir=(0, 0, 1)), Plane(origin=(1.5875, 15.795425564, 15.875), x_dir=(0.9868856549354627, -0.16142089109716573, 0), z_dir=(0, 0, 1)), Plane(origin=(-10.568632679, -11.845658627, 15.875), x_dir=(-0.7035264471488155, 0.7106690778148187, 0), z_dir=(0, 0, 1)), Plane(origin=(8.000003722, -13.711876803, 15.875), x_dir=(-0.8932880855464624, -0.4494845895253094, 0), z_dir=(0, 0, 1)), Plane(origin=(15.512906889, 3.371252713, 15.875), x_dir=(0.1514440485357779, -0.988465831560754, 0), z_dir=(0, 0, 1))) as fillet4_piece_4:
        with BuildLine():
            CenterArc((1.867758316, -1.584453457), FILLET4_R, 86.449791035, 102.839588407)
            Line((0.301077339, -1.840709121), (0, 0))
            ThreePointArc((0, 0), (0.983030693, 0.030465433), (1.966061385, 0))
        make_face()
    extrude(amount=11.265153463)
    with BuildSketch(Plane(origin=(-3.923545533, -2.69948082, 15.875), x_dir=(-0.5877852522924727, -0.8090169943749477, 0), z_dir=(0, 0, 1))) as fillet4_piece_5:
        with BuildLine():
            CenterArc((1.009133253, -1.5875), FILLET4_R, 90, 60)
            ThreePointArc((-0.365682075, -0.79375), (-0.164595577, -0.405280717), (0, 0))
            Line((0, 0), (1.009133253, 0))
        make_face()
    extrude(amount=8.872833134)


solid = part.part
